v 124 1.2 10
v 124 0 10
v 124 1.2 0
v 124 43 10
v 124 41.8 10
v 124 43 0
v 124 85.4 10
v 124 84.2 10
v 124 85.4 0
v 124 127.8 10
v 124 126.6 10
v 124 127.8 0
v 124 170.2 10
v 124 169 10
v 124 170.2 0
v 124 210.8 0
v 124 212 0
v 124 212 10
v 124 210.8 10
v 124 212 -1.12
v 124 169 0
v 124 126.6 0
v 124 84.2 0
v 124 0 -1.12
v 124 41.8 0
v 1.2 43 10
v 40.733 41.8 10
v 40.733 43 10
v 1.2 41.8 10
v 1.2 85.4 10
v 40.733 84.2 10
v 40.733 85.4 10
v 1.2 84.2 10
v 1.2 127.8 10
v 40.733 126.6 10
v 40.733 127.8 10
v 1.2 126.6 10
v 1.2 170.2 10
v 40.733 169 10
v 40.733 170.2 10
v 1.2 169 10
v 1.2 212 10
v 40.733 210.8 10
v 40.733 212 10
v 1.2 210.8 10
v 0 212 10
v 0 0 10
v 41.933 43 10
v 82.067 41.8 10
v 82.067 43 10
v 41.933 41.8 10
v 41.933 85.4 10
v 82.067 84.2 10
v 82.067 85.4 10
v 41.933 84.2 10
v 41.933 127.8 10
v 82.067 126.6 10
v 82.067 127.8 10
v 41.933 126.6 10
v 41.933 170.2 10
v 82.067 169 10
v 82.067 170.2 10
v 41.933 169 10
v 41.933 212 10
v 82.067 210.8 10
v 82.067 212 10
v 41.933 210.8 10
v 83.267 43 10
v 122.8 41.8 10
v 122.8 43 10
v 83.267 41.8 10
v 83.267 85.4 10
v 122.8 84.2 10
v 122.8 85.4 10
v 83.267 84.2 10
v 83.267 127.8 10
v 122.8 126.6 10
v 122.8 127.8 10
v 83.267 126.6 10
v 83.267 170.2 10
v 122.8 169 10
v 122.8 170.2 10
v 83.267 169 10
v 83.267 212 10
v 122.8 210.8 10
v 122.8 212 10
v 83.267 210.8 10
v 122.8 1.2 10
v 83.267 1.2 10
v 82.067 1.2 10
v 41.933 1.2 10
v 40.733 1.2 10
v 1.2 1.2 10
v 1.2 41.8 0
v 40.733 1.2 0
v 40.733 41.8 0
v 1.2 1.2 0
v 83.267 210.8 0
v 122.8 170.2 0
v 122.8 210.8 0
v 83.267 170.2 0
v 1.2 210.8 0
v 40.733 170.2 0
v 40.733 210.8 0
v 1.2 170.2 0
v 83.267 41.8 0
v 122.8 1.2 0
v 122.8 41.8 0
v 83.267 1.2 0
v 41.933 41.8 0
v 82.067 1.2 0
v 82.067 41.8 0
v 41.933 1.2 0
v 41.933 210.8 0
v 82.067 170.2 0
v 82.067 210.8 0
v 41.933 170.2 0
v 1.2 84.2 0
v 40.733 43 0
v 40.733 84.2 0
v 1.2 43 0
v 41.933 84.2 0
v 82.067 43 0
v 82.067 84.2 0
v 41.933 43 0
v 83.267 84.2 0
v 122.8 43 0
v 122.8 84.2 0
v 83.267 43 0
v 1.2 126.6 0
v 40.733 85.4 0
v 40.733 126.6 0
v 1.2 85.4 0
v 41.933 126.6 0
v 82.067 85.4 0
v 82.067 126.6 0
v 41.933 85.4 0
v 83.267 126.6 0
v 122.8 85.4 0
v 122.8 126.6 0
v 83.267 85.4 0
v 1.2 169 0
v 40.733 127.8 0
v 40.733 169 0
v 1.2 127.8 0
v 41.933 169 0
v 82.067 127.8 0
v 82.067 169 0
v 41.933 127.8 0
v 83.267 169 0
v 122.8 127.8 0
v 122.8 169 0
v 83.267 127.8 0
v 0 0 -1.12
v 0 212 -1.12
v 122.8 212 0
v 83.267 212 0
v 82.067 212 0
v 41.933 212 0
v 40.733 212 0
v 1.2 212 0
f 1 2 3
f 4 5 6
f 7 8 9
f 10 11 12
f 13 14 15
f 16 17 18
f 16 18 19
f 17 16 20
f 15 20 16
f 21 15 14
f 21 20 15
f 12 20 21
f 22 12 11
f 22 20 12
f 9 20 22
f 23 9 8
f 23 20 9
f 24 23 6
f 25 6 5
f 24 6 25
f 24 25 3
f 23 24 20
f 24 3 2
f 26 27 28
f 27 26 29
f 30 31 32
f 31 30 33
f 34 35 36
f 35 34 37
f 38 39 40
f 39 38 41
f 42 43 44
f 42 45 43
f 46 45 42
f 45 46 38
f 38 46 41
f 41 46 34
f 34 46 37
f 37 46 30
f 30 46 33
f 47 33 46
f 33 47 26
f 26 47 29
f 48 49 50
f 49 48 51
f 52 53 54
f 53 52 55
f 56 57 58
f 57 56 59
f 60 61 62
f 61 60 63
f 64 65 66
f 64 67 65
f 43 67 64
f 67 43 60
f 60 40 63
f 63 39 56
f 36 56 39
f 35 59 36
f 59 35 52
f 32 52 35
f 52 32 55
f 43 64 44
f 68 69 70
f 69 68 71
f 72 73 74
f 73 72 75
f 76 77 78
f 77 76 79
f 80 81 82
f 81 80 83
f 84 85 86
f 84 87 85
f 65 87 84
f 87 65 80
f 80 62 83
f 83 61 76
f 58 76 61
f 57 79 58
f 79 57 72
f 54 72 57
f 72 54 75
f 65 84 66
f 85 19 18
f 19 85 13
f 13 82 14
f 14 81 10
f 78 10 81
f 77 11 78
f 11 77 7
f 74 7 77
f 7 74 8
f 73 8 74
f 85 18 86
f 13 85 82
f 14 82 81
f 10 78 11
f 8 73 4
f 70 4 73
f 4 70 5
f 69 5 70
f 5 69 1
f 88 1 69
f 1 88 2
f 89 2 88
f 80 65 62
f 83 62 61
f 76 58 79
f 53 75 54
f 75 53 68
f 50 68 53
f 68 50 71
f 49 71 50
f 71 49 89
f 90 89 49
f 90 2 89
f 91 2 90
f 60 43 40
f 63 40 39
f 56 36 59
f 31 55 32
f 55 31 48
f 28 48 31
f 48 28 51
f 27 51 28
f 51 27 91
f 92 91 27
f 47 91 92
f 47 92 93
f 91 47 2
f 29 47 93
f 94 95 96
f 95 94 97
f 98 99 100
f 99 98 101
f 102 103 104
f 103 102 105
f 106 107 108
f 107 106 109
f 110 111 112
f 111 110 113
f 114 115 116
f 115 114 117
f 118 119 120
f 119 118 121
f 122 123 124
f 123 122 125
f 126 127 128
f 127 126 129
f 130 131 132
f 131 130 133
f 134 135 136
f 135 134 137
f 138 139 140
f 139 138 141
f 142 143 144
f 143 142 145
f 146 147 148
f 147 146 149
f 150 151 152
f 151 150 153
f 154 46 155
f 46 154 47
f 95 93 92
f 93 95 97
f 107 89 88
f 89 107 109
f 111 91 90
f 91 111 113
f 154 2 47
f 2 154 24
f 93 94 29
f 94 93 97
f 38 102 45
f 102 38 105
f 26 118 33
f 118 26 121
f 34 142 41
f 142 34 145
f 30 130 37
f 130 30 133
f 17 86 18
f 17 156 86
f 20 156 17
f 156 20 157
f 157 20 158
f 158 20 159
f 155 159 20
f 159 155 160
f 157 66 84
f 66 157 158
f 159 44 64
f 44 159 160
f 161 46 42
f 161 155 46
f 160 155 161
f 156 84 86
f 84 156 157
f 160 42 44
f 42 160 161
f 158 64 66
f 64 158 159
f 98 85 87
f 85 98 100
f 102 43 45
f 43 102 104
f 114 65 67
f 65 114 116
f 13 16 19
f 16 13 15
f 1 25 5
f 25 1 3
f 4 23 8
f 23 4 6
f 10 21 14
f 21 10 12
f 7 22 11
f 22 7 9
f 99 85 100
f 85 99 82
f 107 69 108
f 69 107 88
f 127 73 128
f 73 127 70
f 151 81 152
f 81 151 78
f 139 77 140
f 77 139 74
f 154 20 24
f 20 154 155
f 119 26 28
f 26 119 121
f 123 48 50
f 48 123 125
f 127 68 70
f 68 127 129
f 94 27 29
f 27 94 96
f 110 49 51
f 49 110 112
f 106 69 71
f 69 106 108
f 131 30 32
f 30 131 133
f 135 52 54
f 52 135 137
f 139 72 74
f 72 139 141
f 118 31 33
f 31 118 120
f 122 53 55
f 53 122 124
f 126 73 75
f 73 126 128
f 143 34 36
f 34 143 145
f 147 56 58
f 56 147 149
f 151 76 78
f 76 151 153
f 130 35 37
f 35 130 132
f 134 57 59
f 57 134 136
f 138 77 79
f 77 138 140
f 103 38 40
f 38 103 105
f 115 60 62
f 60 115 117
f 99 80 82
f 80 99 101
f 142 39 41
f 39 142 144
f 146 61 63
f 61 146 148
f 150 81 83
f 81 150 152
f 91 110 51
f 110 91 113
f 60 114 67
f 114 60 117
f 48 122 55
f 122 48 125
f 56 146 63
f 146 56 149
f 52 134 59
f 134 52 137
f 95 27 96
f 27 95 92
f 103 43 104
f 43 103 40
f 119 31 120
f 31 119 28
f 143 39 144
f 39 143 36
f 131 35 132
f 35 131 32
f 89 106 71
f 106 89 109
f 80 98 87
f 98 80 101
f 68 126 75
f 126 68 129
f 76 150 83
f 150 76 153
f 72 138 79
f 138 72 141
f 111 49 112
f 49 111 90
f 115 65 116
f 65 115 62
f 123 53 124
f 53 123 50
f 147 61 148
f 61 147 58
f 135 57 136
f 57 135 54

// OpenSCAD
Piece="Together"; // [Tray, Short, Long, Together]


main(Piece);

module main(p) {
  l=124;
  w=212;

  h=10;
  t=1.2;
  
  if(Piece=="Tray") {
    tray(l,w,h,t,h+0.2);
  }
  if(Piece=="Short") {
    shortSide(l,w,h,t,h/2+0.25);
  }
  if(Piece=="Long") {
    longSide(l,w,h,t,h/2+0.25);
  }
  if(Piece=="Together") {
    tray(l,w,h,t,0,false);
    shortD=w/5;
    longD=l/3;

    for ( i = [1 : 4] ){
      translate([0,shortD*i-t/2,0]) shortSide(l,w,h,t,0);
    }
    for ( i = [1 : 2] ){
      translate([longD*i-t/2,0,0]) longSide(l,w,h,t,0);
    }

  }
}



module tray(l,w,h,t,hh,post=true) {
  translate([0,0,-1.12]) cube([l,w,1.12]);
  if(post) {
    translate([l/2,w/2,0]) cylinder(r=2.5,h=h, $fn=64);
  }
  shortSide(l,w,h,t,hh);
  longSide(l,w,h,t,hh);
  translate([0,w-t,0]) shortSide(l,w,h,t,hh);
  translate([l-t,0,0]) longSide(l,w,h,t,hh);
}

module shortSide(l,w,h,t,hh) {
  difference() {
    cube([l,t,h]);
    translate([l/3-t/2,-0.5,-0.1]) cube([t+0.2,t+2,hh]);
    translate([l/3*2-t/2,-0.5,-0.1]) cube([t+0.2,t+2,hh]);
 
  }
}

module longSide(l,w,h,t,hh) {
  difference() {
    cube([t,w,h]);
    translate([-0.5,w/5-t/2,-0.1]) cube([t+2,t+0.2,hh]);
    translate([-0.5,w/5*2-t/2,-0.1]) cube([t+2,t+0.2,hh]);
    translate([-0.5,w/5*3-t/2,-0.1]) cube([t+2,t+0.2,hh]);
    translate([-0.5,w/5*4-t/2,-0.1]) cube([t+2,t+0.2,hh]);
   // translate([-0.5,w/6*5-t/2,-0.1]) cube([t+2,t+0.2,hh]);
  } 
}
